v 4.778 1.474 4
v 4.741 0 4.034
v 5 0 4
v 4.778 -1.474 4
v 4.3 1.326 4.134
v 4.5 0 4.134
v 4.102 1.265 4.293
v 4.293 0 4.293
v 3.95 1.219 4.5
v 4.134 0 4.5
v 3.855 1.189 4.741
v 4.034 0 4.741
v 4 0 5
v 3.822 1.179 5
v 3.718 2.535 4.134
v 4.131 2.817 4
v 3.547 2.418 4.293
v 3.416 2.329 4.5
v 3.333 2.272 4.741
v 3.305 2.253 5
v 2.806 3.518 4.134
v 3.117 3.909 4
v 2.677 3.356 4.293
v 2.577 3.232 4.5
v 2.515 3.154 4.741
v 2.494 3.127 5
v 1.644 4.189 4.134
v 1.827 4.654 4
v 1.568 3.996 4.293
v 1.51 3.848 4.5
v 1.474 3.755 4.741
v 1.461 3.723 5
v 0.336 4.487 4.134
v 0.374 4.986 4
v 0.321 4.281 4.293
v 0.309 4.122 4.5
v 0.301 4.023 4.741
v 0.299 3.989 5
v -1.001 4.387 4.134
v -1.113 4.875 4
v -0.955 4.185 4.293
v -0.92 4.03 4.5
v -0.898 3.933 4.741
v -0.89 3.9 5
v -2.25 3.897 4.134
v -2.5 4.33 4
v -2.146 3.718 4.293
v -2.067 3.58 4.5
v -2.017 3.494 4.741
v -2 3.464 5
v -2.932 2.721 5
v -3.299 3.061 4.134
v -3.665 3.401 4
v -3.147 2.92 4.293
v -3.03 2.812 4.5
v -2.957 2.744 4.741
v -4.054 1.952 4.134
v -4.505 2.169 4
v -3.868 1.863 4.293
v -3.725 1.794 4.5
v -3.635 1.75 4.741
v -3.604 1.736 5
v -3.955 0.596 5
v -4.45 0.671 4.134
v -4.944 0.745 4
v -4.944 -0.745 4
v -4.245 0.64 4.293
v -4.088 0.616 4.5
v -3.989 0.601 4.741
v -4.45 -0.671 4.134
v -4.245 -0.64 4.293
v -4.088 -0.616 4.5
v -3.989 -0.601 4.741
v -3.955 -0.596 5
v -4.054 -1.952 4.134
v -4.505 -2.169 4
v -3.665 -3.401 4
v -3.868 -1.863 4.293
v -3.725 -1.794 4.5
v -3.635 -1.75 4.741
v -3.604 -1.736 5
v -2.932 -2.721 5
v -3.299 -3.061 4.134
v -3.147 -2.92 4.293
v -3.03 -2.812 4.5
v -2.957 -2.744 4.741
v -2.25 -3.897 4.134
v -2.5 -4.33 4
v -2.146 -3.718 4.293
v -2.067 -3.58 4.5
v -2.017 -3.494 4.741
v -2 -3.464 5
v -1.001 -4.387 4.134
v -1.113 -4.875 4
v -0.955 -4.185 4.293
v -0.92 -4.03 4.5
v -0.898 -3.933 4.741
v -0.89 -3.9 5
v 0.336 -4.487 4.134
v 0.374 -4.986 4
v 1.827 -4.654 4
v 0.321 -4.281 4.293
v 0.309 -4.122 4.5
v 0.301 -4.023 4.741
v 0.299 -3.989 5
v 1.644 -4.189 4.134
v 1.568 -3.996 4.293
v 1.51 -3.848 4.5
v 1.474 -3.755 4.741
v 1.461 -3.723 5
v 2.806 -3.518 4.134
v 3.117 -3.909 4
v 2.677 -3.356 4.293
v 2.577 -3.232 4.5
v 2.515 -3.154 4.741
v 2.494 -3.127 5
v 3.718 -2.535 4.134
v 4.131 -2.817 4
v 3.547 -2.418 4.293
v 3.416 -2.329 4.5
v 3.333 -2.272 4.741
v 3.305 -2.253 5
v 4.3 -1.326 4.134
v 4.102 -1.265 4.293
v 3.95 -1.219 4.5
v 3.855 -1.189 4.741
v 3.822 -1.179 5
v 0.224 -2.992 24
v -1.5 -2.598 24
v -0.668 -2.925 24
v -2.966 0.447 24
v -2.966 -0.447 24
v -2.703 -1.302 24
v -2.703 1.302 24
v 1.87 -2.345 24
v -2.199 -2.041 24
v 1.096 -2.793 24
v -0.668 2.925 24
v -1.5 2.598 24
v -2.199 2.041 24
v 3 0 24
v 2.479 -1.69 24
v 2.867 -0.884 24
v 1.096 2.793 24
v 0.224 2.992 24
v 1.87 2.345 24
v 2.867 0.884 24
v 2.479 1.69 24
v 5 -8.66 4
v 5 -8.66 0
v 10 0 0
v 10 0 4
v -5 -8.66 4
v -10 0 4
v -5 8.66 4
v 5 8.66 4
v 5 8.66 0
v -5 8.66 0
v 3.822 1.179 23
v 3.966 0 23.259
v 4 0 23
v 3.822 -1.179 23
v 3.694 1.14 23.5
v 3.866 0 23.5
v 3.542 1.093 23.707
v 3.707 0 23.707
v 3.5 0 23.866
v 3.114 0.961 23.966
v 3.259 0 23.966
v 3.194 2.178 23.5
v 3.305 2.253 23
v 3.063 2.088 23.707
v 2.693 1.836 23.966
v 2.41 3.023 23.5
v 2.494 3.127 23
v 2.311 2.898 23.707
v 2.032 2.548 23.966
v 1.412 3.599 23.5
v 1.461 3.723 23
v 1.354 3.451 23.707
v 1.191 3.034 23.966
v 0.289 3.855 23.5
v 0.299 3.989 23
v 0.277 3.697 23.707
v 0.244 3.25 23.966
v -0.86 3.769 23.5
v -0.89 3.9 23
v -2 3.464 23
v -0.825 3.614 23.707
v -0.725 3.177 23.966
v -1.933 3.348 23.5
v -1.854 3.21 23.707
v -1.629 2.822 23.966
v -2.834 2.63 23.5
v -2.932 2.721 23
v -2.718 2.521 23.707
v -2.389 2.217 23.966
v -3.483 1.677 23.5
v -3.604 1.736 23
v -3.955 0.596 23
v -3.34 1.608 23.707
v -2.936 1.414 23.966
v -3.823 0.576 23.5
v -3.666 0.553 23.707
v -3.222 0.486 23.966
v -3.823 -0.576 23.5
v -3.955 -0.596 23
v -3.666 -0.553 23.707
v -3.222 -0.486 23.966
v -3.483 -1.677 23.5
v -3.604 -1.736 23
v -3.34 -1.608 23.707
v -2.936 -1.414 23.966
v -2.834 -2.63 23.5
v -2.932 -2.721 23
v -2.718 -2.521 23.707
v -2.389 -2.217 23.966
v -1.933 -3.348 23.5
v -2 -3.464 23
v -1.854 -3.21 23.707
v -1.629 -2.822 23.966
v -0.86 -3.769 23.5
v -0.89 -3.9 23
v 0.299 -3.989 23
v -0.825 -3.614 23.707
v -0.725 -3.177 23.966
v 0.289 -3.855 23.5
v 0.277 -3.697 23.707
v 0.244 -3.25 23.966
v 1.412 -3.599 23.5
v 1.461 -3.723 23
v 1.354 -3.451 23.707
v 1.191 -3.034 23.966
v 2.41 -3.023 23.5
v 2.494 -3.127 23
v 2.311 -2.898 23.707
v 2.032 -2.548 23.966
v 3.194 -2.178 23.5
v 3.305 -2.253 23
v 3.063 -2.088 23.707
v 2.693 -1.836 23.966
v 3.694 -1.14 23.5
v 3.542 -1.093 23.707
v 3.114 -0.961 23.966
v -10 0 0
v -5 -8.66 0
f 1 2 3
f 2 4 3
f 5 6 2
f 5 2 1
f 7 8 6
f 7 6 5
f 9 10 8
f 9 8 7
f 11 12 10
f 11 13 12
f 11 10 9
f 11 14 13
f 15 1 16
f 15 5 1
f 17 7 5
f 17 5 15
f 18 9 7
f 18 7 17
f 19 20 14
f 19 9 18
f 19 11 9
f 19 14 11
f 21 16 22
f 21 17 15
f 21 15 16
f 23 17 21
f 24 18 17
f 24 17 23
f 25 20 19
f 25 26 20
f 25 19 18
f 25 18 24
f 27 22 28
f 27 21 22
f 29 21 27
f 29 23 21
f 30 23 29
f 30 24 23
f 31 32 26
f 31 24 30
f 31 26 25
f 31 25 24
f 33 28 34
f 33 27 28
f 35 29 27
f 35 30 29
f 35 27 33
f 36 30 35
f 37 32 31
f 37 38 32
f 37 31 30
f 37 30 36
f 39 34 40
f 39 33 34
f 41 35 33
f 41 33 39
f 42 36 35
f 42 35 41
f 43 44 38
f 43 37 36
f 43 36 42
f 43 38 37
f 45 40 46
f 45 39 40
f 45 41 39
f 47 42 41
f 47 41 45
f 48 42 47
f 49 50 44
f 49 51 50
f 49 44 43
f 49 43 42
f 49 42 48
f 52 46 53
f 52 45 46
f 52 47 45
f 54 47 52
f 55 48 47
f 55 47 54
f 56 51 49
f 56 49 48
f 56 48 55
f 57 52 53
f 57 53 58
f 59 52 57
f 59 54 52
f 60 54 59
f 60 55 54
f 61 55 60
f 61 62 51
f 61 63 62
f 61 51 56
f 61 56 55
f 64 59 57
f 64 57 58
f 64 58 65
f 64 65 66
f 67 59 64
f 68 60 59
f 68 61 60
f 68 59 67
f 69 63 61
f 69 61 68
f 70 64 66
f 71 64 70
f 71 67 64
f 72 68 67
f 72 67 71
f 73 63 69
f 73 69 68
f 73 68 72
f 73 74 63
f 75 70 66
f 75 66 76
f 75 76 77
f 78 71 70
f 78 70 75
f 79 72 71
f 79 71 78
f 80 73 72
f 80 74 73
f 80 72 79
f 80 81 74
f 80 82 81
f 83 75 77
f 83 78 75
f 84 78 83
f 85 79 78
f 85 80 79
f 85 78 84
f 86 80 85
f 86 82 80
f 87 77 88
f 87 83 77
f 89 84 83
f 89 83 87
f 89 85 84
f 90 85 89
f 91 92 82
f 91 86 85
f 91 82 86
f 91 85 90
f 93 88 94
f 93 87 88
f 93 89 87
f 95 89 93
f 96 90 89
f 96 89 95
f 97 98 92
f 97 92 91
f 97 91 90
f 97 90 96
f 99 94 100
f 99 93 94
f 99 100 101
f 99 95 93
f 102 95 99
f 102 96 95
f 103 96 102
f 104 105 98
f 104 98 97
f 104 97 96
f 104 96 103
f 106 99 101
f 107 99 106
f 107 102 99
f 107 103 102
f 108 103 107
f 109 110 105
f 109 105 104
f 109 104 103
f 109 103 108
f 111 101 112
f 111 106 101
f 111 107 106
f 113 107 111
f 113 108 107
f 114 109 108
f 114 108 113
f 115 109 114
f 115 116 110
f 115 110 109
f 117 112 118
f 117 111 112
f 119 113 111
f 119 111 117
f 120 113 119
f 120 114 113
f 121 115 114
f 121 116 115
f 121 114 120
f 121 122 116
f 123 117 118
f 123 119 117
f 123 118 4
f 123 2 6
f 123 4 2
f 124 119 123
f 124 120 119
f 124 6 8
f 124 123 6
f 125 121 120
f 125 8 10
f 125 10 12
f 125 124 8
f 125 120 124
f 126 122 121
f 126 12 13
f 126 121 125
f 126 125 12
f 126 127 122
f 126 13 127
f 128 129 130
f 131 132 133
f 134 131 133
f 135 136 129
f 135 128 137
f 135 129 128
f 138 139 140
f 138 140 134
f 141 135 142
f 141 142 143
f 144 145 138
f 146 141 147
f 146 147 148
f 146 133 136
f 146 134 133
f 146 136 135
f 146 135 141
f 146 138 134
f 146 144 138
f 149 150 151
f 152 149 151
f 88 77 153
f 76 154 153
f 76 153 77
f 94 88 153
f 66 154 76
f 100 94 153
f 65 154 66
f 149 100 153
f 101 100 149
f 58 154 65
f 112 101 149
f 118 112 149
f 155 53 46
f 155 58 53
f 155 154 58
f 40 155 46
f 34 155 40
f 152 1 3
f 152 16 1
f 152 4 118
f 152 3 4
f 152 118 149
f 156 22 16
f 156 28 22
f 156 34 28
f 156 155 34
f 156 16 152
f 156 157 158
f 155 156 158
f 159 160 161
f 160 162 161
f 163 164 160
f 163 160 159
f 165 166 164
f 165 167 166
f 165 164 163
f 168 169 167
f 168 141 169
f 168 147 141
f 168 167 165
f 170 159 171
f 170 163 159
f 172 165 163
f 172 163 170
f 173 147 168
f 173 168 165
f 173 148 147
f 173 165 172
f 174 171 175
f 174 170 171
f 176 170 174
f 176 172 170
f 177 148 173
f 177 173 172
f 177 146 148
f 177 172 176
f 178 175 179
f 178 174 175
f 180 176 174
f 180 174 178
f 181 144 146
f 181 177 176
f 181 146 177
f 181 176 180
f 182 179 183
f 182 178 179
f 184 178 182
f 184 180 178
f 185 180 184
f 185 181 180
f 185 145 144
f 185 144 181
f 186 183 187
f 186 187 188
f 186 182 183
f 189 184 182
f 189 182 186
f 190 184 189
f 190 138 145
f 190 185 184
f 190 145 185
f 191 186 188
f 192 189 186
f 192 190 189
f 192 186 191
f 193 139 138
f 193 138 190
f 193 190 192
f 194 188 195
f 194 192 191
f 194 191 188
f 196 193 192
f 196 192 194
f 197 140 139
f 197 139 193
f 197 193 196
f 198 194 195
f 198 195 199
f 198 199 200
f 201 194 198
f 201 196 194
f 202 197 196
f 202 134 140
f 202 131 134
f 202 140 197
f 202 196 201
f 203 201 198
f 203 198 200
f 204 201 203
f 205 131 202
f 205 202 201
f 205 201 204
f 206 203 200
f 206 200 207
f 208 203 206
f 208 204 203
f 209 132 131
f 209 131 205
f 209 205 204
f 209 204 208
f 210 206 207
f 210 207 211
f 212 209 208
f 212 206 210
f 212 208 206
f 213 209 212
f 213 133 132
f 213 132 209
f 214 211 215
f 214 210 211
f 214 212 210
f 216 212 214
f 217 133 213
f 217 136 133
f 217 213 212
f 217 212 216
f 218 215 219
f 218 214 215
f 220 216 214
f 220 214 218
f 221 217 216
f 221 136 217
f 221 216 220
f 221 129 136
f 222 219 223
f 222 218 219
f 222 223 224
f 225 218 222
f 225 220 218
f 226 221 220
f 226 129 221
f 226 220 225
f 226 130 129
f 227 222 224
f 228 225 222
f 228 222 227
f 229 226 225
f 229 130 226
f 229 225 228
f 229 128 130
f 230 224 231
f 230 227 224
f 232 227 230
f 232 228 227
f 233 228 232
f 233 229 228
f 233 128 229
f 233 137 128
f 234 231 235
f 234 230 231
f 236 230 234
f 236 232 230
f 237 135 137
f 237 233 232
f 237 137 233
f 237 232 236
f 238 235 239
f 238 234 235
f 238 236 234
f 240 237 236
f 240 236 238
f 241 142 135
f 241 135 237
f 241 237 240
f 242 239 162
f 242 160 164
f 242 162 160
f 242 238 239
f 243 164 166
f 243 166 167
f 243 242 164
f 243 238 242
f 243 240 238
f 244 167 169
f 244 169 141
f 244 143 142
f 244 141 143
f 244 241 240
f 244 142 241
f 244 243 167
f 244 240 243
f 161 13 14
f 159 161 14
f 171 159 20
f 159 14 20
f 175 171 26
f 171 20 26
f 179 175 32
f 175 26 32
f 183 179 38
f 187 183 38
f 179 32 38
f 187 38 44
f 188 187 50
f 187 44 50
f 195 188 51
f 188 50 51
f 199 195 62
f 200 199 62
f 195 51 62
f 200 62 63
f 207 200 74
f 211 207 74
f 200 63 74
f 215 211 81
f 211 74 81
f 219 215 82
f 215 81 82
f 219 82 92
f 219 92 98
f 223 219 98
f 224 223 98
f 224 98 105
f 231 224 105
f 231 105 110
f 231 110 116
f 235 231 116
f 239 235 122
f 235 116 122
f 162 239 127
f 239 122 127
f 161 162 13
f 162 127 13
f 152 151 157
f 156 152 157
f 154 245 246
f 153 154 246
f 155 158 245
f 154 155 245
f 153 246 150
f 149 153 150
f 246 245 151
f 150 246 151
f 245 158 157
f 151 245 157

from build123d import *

# Parameters (mm, degrees)
BOSS_EXTRUDE1_DEPTH = 4
SKETCH3_R           = 4
BOSS_EXTRUDE2_DEPTH = 20
FILLET2_R           = 1


with BuildPart() as part:
    # Sketch2 → Boss-Extrude1 (new body)
    with BuildSketch(Plane.XY):
        Polygon((-10, 0), (-5, -8.660254038), (5, -8.660254038), (10, 0), (5, 8.660254038), (-5, 8.660254038), align=None)
    extrude(amount=BOSS_EXTRUDE1_DEPTH)

    # Sketch3 → Boss-Extrude2 (add)
    with BuildSketch(Plane.XY.offset(4)):
        Circle(SKETCH3_R)
    extrude(amount=BOSS_EXTRUDE2_DEPTH)

    # Fillet2
    fillet2_edges = [part.edges().sort_by_distance(p)[0] for p in [
        (-4, 0, 4),
        (-4, 0, 24),
    ]]
    fillet(fillet2_edges, radius=FILLET2_R)


solid = part.part
